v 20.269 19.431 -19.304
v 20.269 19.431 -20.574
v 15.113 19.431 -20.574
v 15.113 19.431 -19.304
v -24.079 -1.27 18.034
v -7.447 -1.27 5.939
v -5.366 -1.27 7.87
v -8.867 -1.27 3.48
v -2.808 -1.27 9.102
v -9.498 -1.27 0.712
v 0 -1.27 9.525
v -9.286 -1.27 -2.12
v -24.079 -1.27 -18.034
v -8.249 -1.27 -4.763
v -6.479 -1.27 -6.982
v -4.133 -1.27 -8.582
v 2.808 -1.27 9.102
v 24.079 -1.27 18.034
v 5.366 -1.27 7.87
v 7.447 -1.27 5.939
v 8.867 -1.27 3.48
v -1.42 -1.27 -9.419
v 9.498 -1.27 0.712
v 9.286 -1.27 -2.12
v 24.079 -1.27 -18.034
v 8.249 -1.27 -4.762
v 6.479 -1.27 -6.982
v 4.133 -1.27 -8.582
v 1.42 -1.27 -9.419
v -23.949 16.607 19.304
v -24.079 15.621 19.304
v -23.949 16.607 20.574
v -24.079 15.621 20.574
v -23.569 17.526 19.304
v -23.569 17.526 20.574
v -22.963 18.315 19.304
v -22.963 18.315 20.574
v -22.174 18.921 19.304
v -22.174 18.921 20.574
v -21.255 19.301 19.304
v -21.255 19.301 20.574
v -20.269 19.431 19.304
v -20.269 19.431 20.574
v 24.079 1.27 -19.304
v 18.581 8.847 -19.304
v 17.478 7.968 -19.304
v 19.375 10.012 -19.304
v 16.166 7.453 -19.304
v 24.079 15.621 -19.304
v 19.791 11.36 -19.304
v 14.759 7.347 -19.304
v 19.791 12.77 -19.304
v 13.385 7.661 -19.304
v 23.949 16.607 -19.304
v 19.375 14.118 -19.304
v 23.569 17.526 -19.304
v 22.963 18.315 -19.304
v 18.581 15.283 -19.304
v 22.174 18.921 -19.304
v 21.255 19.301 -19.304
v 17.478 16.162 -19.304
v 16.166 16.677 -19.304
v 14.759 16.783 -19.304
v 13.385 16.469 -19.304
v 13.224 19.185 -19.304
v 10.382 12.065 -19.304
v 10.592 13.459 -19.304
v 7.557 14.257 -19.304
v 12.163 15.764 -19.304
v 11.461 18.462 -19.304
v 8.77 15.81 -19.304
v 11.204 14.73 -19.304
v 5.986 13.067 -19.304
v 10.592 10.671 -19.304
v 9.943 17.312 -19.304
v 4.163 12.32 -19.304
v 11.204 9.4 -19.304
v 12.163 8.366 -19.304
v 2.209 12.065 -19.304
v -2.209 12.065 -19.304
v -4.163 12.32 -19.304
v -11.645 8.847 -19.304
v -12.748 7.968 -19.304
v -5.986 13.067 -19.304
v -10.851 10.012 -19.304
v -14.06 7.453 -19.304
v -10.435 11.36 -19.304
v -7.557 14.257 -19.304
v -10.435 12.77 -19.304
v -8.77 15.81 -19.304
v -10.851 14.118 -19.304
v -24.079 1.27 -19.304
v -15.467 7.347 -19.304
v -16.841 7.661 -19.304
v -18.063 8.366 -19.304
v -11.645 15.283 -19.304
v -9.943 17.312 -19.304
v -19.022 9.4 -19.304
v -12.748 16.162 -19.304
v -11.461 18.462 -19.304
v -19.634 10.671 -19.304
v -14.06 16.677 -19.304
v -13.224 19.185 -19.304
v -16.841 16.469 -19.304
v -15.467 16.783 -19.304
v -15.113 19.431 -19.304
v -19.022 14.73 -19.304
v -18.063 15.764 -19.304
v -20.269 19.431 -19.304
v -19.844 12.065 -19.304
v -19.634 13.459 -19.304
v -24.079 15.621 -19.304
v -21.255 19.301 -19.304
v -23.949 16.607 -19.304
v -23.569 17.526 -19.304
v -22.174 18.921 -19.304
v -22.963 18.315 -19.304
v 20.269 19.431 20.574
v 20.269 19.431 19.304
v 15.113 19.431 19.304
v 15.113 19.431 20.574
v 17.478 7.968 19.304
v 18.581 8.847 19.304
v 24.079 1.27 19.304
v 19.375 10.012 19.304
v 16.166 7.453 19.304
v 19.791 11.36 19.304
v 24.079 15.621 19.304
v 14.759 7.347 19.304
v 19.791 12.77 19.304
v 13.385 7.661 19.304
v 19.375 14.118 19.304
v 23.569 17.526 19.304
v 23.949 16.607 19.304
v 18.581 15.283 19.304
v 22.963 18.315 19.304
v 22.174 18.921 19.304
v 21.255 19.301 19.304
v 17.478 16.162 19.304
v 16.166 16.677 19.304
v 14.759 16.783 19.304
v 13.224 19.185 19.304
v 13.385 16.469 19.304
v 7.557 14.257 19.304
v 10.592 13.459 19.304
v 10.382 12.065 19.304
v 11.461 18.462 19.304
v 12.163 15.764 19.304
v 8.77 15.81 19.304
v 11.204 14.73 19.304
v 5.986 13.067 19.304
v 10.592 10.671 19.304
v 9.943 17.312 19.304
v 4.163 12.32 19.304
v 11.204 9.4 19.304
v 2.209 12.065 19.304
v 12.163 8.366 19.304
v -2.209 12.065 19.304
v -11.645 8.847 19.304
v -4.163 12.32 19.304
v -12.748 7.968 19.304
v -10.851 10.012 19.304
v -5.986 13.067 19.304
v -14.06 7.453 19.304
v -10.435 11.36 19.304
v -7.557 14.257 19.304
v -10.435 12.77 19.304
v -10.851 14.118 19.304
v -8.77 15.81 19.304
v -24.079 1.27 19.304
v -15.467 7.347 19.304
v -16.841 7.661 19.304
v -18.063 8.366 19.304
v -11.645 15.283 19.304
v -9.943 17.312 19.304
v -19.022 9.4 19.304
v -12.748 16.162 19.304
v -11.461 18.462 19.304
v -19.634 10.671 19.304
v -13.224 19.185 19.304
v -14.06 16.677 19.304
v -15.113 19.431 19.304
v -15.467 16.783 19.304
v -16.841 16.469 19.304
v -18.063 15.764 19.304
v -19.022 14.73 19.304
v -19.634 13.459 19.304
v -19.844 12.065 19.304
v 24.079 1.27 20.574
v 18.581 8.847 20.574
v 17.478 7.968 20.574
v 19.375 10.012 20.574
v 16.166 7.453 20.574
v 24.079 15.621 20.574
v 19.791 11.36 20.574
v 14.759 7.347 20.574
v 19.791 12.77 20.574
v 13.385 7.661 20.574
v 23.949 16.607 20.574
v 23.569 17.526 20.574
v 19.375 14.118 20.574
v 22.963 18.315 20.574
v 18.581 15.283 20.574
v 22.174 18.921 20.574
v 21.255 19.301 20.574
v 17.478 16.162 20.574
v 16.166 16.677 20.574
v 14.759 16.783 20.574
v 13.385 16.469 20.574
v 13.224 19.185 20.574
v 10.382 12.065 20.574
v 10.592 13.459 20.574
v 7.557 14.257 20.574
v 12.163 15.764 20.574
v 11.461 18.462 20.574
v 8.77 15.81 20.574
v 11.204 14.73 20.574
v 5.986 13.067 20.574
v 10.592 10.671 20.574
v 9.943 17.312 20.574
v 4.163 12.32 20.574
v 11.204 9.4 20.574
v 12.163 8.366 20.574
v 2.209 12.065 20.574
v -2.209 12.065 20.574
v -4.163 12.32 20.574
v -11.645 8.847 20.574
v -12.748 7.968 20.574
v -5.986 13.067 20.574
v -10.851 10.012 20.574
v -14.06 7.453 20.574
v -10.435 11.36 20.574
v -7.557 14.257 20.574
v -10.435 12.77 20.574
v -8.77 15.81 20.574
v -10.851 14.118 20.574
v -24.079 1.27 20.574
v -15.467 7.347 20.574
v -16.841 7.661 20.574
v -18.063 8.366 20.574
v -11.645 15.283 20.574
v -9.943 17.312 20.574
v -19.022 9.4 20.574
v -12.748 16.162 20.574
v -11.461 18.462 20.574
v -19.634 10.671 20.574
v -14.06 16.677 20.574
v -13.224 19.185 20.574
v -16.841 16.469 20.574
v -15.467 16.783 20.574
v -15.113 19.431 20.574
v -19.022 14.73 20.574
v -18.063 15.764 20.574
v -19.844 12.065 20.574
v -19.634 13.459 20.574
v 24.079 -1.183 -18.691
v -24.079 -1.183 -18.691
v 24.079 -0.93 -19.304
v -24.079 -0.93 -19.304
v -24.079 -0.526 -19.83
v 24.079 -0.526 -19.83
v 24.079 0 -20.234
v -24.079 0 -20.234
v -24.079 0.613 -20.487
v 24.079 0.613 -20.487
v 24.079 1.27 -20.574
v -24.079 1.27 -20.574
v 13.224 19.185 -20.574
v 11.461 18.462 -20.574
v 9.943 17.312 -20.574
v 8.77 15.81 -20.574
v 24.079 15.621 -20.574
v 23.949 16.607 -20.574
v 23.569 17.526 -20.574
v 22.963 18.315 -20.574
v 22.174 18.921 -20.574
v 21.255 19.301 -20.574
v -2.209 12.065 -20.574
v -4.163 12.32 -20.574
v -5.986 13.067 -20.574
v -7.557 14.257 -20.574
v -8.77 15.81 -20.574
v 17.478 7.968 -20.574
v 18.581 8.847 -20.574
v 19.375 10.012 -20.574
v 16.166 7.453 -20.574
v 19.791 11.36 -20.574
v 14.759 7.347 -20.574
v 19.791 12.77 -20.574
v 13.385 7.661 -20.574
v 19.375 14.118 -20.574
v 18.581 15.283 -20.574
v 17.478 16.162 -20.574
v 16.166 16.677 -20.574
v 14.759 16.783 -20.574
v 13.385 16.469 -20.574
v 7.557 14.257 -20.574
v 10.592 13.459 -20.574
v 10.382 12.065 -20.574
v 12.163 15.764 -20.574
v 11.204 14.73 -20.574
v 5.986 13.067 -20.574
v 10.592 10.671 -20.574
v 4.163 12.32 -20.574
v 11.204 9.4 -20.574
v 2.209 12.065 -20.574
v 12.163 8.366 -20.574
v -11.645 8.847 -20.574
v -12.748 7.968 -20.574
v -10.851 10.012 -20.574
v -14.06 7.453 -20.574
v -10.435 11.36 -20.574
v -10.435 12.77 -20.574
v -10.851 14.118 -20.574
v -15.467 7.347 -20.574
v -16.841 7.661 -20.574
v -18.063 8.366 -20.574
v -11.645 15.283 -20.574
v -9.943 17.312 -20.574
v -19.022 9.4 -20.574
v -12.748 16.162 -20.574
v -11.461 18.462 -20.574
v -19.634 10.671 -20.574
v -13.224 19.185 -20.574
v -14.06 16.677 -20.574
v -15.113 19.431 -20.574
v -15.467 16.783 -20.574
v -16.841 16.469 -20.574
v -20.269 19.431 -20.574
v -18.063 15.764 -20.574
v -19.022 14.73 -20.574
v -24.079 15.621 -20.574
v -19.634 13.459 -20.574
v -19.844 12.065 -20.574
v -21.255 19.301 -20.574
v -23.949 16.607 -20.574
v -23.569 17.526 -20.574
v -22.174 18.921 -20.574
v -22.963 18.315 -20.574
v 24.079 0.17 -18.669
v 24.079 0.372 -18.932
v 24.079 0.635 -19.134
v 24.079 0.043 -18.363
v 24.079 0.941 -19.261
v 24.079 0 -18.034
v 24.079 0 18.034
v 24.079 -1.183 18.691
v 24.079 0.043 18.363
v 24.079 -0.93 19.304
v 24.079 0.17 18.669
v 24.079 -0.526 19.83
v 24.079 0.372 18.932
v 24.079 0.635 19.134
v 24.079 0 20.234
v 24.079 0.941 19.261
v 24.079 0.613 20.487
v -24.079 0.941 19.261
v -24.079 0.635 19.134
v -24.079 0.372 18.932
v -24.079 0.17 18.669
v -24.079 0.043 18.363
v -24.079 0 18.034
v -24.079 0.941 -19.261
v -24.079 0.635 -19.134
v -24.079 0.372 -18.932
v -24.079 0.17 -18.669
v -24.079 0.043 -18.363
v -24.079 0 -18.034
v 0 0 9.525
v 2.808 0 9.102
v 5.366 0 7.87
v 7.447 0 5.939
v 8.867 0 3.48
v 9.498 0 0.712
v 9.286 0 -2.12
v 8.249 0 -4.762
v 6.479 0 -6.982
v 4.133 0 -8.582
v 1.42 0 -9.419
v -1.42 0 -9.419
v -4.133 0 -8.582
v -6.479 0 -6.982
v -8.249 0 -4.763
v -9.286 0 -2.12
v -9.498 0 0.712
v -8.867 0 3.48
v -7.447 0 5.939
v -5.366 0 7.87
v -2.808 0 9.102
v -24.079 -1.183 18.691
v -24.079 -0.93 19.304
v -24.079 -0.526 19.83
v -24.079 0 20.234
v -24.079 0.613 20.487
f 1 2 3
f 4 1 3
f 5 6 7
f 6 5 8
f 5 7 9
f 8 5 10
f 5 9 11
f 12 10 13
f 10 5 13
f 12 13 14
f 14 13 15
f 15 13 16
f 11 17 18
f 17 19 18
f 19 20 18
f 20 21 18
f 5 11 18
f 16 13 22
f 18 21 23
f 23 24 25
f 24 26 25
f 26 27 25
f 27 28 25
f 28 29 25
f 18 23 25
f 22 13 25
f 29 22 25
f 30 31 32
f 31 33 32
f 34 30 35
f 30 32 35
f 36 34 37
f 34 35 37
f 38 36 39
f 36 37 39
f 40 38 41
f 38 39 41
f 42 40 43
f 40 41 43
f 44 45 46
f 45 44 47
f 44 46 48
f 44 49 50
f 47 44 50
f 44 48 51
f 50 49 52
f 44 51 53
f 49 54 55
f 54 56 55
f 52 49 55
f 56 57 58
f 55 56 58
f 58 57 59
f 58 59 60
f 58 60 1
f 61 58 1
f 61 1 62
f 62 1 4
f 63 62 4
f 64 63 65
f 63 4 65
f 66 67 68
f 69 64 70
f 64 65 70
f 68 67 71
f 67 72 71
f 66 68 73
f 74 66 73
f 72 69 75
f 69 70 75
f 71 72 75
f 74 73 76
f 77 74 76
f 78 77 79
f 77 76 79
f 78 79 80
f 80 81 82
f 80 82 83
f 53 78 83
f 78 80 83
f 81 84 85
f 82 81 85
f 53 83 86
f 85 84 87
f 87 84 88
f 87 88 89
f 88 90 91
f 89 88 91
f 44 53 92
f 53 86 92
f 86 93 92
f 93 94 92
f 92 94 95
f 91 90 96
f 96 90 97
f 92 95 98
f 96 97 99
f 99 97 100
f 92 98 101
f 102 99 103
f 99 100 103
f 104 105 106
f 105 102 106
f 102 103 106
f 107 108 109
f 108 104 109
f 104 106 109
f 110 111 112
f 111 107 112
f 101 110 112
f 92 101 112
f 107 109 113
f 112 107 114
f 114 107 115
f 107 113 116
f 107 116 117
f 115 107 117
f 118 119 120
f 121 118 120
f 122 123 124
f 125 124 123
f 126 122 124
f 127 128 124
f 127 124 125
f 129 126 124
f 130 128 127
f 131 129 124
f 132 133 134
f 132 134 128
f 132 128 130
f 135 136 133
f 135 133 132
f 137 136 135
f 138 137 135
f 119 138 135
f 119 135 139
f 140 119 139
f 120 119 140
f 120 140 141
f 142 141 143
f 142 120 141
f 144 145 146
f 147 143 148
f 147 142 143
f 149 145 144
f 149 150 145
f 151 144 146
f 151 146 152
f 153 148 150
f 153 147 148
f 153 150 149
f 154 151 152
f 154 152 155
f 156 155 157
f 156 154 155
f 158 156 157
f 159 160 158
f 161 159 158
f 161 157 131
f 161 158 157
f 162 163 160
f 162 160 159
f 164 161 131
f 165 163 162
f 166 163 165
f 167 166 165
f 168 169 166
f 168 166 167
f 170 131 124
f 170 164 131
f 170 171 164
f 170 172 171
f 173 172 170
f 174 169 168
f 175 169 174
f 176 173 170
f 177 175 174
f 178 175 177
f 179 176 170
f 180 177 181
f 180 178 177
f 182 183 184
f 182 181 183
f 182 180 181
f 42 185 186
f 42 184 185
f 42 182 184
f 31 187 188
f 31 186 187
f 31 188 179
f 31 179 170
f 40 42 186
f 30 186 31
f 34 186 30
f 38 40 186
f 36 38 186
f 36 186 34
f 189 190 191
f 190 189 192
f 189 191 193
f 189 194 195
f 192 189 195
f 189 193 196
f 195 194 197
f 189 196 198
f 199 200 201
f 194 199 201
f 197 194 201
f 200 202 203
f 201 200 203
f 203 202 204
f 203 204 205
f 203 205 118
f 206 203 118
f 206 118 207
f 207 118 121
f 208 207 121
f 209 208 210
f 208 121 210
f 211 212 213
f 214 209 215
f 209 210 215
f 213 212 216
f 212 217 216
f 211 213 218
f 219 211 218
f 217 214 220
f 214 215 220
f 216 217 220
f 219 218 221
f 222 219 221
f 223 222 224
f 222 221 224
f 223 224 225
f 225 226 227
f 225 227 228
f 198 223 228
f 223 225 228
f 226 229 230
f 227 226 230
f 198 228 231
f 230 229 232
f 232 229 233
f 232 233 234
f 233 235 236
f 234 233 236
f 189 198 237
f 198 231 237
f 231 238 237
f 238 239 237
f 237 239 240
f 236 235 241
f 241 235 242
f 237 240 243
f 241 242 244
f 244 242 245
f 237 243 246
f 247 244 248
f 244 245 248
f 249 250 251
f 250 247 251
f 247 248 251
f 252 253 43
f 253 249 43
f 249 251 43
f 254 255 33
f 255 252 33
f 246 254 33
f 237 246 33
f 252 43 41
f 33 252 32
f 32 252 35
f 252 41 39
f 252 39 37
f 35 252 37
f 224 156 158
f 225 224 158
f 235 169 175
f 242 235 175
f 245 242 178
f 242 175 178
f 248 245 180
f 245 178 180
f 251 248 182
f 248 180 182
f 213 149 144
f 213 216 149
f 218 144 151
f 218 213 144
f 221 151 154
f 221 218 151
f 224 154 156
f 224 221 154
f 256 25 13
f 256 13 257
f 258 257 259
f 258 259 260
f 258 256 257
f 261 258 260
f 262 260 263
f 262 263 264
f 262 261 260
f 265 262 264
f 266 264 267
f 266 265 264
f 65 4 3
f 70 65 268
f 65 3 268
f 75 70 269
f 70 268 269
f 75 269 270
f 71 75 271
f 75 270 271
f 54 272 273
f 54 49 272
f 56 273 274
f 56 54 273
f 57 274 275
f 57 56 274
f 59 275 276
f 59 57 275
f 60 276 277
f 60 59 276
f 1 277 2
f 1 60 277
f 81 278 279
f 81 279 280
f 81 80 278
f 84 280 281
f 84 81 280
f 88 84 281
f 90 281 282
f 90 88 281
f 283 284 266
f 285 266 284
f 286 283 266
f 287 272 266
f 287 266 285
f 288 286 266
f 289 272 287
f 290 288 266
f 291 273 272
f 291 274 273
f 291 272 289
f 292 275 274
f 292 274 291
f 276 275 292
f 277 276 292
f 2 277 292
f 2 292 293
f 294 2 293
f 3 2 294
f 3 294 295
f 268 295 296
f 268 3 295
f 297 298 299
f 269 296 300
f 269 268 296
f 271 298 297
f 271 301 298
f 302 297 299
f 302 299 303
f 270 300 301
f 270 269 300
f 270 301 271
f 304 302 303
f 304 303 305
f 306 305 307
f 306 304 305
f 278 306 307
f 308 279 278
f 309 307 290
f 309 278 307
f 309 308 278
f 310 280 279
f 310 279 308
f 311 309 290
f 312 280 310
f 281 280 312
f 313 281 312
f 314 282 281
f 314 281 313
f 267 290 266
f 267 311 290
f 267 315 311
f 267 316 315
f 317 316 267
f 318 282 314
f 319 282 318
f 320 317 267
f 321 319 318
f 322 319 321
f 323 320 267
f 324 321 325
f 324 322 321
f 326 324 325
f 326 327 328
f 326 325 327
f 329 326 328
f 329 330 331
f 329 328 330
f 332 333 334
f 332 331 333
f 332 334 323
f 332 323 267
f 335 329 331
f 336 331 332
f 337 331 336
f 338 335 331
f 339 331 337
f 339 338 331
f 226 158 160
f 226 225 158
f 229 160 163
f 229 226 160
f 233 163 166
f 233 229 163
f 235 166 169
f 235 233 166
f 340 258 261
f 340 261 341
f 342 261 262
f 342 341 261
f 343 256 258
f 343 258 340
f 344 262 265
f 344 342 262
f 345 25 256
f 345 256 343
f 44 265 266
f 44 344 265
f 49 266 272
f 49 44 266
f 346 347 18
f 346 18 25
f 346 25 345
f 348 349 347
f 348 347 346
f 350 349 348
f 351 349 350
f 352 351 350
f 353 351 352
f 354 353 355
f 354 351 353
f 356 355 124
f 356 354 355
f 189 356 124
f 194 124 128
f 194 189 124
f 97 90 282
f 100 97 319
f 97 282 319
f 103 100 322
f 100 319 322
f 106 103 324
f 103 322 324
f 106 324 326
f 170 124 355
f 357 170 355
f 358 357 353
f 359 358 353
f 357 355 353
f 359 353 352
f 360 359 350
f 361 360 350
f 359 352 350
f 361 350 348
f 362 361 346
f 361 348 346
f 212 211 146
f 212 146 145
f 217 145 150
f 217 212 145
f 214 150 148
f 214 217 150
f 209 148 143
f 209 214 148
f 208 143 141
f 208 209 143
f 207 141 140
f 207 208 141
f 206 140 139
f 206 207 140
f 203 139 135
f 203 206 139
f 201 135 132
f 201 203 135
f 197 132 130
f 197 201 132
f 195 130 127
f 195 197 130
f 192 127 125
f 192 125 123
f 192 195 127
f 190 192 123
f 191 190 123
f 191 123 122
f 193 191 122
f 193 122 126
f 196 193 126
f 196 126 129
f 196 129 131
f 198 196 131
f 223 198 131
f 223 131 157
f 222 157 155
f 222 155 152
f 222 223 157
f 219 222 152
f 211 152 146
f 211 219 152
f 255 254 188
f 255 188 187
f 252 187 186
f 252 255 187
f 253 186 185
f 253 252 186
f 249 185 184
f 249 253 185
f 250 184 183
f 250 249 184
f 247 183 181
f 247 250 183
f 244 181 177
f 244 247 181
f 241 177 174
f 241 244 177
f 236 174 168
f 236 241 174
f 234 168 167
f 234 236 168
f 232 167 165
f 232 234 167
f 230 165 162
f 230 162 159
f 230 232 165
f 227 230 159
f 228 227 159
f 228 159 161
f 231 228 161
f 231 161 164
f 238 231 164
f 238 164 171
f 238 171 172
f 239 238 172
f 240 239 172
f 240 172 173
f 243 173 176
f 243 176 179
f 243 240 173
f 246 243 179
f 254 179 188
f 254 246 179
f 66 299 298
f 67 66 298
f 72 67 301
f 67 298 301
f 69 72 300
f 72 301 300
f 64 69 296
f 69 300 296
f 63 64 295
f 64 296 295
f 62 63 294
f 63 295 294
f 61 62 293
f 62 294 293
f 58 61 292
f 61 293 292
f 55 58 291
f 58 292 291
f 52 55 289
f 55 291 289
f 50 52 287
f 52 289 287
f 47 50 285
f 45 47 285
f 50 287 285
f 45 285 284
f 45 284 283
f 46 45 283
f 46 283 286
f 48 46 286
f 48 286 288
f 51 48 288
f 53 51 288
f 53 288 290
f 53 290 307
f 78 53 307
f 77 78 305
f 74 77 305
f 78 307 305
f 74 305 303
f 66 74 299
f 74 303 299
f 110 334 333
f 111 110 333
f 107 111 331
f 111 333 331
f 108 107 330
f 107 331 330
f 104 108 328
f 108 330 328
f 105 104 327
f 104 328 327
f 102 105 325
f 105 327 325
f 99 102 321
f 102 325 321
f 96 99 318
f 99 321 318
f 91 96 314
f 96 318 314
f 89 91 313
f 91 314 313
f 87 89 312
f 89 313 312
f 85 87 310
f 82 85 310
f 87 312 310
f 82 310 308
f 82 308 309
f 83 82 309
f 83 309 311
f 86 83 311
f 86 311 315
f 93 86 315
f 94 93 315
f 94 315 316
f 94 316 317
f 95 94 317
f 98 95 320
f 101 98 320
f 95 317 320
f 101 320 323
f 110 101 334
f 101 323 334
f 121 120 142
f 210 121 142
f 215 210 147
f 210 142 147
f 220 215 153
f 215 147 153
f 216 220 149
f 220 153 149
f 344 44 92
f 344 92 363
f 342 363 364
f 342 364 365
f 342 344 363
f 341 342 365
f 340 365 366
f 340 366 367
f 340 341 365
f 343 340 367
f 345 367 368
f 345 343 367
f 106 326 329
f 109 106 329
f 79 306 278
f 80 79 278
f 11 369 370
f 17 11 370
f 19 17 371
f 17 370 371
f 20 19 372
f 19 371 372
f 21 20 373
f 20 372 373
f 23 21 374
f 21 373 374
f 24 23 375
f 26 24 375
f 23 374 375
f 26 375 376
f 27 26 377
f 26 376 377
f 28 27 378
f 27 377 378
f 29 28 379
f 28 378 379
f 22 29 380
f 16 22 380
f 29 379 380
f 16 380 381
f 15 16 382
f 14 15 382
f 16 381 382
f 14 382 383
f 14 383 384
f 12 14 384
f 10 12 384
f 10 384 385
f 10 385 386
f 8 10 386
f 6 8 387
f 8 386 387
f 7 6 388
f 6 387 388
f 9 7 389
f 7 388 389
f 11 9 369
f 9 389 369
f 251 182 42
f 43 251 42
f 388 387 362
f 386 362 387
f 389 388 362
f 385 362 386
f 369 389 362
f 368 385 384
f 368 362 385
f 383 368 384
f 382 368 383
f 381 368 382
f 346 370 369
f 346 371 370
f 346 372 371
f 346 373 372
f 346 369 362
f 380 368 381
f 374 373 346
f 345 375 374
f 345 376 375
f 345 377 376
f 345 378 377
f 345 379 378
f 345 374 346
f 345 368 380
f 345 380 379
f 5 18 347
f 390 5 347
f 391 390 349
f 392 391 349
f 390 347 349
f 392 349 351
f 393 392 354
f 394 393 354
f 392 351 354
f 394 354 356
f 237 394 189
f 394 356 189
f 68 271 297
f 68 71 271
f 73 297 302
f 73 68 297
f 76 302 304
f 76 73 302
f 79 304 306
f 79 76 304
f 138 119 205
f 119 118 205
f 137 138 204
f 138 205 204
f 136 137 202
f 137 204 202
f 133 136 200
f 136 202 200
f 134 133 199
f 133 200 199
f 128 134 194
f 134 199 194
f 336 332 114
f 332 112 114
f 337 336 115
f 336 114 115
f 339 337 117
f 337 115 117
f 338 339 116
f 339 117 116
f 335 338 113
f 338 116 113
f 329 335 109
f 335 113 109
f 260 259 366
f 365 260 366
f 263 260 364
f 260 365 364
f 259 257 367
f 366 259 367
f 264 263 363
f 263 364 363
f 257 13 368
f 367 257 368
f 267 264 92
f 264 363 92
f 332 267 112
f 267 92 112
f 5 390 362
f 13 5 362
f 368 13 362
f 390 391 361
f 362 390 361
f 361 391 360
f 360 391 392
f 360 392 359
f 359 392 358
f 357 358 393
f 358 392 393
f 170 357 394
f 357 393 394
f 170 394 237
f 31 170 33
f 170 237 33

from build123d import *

# Parameters (mm, degrees)
SKETCH1_W               = 48.1584
SKETCH1_H               = 36.068
SKETCH1_R               = 9.525
BASE_FLANGE1_DEPTH      = 1.27
EDGE_FLANGE1_DEPTH      = 48.1584
EDGE_FLANGE1_START      = 1.27
EDGE_FLANGE1_PROFILE_W  = 48.1584
EDGE_FLANGE1_PROFILE_H  = 19.7612
EDGE_FLANGE1_PROFILE_R  = 4.73075
EDGE_FLANGE1_FLAT_DEPTH = 1.27
CUT_EXTRUDE7_DEPTH      = 53.108321313
FILLET2_R               = 7.62
FILLET3_R               = 3.81


# Sheet-metal steps are written as plain solids
with BuildPart() as part:
    # Sketch1 → Base-Flange1 (new body)
    with BuildSketch(Plane(origin=(0, 0, 0), x_dir=(1, 0, 0), z_dir=(0, 1, 0))):
        Rectangle(SKETCH1_W, SKETCH1_H)
        with Locations(Location((0, 0, 0), (0, 0, 270))):
            Circle(SKETCH1_R, mode=Mode.SUBTRACT)
    extrude(amount=-BASE_FLANGE1_DEPTH)

    # Edge-Flange1 bend section (across the edge) → Edge-Flange1 (add)
    with BuildSketch(Plane(origin=(24.0792, 0, -19.304), x_dir=(0, 0, 1), z_dir=(-1, 0, 0))):
        with BuildLine():
            Line((-1.27, 1.27), (0, 1.27))
            ThreePointArc((0, 1.27), (0.371974388, 0.371974388), (1.27, 0))
            Line((1.27, 0), (1.27, -1.27))
            ThreePointArc((1.27, -1.27), (-0.526051224, -0.526051224), (-1.27, 1.27))
        make_face()
    edge_flange1 = extrude(amount=EDGE_FLANGE1_DEPTH)

    # Edge-Flange1 profile (on flange) → Edge-Flange1 flat (add)
    with BuildSketch(Plane(origin=(0, 0, -19.304), x_dir=(-1, 0, 0), z_dir=(0, 0, -1)).offset(EDGE_FLANGE1_START)):
        with Locations((0, 11.1506)):
            Rectangle(EDGE_FLANGE1_PROFILE_W, EDGE_FLANGE1_PROFILE_H)
        with Locations((-15.113, 12.065)):
            Circle(EDGE_FLANGE1_PROFILE_R, mode=Mode.SUBTRACT)
        with Locations((15.113, 12.065)):
            Circle(EDGE_FLANGE1_PROFILE_R, mode=Mode.SUBTRACT)
    edge_flange1_flat = extrude(amount=-EDGE_FLANGE1_FLAT_DEPTH)

    # Mirror1: Edge-Flange1, Edge-Flange1 flat across plane
    add(edge_flange1.mirror(Plane.XY))
    add(edge_flange1_flat.mirror(Plane.XY))

    # Sketch11 → Cut-Extrude7 (cut, through all)
    with BuildSketch(Plane(origin=(0, 0, -20.574), x_dir=(-1, 0, 0), z_dir=(0, 0, -1))):
        with BuildLine():
            Line((24.0792, 19.431), (24.0792, 21.0312))
            Line((24.0792, 21.0312), (-24.0792, 21.0312))
            Line((-24.0792, 21.0312), (-24.0792, 19.431))
            Line((-24.0792, 19.431), (-15.113, 19.431))
            ThreePointArc((-15.113, 19.431), (-9.90445145, 17.27354855), (-7.747, 12.065))
            Line((-7.747, 12.065), (7.747, 12.065))
            ThreePointArc((7.747, 12.065), (9.90445145, 17.27354855), (15.113, 19.431))
            Line((15.113, 19.431), (24.0792, 19.431))
        make_face()
    extrude(amount=-CUT_EXTRUDE7_DEPTH, mode=Mode.SUBTRACT)

    # Fillet2
    fillet2_edges = [part.edges().sort_by_distance(p)[0] for p in [
        (7.747, 12.065, -19.939),
        (-7.747, 12.065, -19.939),
        (7.747, 12.065, 19.939),
        (-7.747, 12.065, 19.939),
    ]]
    fillet(fillet2_edges, radius=FILLET2_R)

    # Fillet3
    fillet3_edges = [part.edges().sort_by_distance(p)[0] for p in [
        (-24.0792, 19.431, -19.939),
        (24.0792, 19.431, -19.939),
        (24.0792, 19.431, 19.939),
        (-24.0792, 19.431, 19.939),
    ]]
    fillet(fillet3_edges, radius=FILLET3_R)


solid = part.part
